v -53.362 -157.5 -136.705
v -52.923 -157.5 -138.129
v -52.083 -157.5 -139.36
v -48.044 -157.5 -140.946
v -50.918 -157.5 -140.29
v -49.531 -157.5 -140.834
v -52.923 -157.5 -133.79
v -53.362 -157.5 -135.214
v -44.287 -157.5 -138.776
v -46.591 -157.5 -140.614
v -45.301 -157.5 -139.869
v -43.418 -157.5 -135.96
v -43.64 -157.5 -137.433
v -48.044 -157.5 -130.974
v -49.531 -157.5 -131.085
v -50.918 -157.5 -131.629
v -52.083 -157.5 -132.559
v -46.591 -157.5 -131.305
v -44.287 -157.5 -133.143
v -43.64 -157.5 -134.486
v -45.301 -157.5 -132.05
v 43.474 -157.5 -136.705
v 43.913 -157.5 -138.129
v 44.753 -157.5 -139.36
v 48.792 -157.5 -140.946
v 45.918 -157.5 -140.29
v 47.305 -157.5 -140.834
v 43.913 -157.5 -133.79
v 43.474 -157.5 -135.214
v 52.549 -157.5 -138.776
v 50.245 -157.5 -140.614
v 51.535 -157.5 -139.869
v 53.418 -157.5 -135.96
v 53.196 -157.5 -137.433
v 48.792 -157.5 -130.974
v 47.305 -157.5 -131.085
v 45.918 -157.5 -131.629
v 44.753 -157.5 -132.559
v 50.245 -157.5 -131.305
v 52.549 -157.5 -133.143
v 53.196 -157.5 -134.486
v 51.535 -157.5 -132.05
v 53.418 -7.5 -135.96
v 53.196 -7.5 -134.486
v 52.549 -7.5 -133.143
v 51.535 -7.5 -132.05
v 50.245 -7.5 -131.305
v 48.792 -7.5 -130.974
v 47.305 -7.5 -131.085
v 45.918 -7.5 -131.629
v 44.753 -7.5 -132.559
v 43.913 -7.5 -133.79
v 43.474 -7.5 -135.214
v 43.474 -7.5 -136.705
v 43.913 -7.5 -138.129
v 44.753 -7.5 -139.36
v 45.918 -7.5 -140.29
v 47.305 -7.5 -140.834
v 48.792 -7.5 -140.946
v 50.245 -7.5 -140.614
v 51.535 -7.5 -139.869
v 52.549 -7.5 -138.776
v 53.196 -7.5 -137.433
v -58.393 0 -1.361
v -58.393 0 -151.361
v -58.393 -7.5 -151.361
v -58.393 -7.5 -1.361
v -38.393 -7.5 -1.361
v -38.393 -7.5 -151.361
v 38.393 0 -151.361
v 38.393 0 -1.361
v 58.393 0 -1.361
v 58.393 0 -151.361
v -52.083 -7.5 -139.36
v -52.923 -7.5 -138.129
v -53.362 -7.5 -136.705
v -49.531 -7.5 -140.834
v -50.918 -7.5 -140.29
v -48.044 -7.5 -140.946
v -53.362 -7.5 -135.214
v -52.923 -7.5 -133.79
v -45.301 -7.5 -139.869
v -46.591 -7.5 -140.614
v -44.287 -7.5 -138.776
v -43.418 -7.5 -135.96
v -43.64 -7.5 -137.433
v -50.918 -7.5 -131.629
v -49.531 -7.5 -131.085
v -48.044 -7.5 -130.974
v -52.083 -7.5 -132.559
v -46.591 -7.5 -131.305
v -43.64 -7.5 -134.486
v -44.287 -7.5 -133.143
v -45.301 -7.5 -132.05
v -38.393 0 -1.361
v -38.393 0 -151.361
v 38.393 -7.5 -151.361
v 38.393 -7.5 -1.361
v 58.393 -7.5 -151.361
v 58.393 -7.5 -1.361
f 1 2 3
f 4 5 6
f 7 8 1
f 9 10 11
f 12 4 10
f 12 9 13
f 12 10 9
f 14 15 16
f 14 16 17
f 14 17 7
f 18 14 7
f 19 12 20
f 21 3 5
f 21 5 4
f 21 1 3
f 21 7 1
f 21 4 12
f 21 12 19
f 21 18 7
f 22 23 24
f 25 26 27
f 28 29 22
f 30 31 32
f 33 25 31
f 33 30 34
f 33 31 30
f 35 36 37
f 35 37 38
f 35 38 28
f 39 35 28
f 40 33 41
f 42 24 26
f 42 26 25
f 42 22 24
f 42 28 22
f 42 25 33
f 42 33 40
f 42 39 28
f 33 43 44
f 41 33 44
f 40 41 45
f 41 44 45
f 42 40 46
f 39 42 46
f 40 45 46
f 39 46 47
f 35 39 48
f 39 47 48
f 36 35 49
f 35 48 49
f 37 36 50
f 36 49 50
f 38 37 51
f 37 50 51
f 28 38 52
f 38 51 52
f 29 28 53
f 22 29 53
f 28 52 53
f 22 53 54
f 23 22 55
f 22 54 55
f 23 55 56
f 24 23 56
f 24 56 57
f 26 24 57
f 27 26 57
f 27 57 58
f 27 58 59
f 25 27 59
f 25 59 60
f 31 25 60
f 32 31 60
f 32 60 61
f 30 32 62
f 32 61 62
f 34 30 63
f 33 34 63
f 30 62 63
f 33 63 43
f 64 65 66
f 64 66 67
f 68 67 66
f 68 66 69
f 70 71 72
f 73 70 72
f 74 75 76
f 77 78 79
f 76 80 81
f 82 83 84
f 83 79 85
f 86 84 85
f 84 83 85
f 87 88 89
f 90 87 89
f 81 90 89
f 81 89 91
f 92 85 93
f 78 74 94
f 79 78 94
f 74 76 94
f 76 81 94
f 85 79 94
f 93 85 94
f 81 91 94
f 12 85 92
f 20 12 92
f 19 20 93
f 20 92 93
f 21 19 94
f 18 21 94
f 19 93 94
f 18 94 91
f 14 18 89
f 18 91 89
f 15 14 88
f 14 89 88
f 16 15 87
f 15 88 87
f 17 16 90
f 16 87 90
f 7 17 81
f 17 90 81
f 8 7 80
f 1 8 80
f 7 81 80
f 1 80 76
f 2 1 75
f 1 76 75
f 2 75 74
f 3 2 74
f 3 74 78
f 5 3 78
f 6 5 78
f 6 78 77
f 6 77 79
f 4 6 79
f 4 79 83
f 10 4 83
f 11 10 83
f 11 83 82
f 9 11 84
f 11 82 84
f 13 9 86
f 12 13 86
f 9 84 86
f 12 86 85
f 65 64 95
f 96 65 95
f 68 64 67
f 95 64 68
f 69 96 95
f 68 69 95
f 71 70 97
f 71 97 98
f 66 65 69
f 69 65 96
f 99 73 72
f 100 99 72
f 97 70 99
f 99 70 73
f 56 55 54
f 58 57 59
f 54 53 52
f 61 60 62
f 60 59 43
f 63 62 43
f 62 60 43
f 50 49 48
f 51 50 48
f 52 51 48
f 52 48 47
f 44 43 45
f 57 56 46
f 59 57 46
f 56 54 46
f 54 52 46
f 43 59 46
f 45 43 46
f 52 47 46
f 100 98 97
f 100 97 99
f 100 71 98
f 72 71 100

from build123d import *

# Parameters (mm, degrees)
F0_W     = 20
F0_H     = 150
F1_DEPTH = 7.5
F2_DEPTH = 7.5
F5_R     = 5
F6_DEPTH = 150


# Not quite as in the source:
# - a feature of the source that left no trace in its solid (it failed there, or was rolled back) is left out


with BuildPart() as f1:
    # F0 (on Front) → F1 (new body)
    with BuildSketch(Plane.XZ):
        with Locations((48.3931005001, -76.3607483447)):
            Rectangle(F0_W, F0_H)
    extrude(amount=F1_DEPTH)


with BuildPart() as f1b:
    # F0 (on Front) → F1, piece 2 (new body)
    with BuildSketch(Plane.XZ):
        with Locations((-48.3931005001, -76.3607483447)):
            Rectangle(F0_W, F0_H)
    extrude(amount=F1_DEPTH)


with BuildPart() as f2:
    # F2 (new): a face of the model
    f2_faces = [f1.part.faces().sort_by_distance(p)[0] for p in [
        (48.3931005001, -7.5, -76.3607483447),
    ]]
    extrude(f2_faces, amount=-F2_DEPTH)


with BuildPart() as f2b:
    # F2#2 (new): a face of the model
    f2_2_faces = [f1b.part.faces().sort_by_distance(p)[0] for p in [
        (-48.3931005001, -7.5, -76.3607483447),
    ]]
    extrude(f2_2_faces, amount=-F2_DEPTH)


with BuildPart() as f6:
    # F5 (on face) → F6 (new body)
    with BuildSketch(Plane.XZ.offset(7.5)):
        with Locations((48.4179630876, -135.9595805407)):
            Circle(F5_R)
    extrude(amount=F6_DEPTH)


with BuildPart() as f6b:
    # F5 (on face) → F6, piece 2 (new body)
    with BuildSketch(Plane.XZ.offset(7.5)):
        with Locations((-48.4179630876, -135.9595805407)):
            Circle(F5_R)
    extrude(amount=F6_DEPTH)


solid = Compound([f1.part, f1b.part, f6.part, f6b.part])
